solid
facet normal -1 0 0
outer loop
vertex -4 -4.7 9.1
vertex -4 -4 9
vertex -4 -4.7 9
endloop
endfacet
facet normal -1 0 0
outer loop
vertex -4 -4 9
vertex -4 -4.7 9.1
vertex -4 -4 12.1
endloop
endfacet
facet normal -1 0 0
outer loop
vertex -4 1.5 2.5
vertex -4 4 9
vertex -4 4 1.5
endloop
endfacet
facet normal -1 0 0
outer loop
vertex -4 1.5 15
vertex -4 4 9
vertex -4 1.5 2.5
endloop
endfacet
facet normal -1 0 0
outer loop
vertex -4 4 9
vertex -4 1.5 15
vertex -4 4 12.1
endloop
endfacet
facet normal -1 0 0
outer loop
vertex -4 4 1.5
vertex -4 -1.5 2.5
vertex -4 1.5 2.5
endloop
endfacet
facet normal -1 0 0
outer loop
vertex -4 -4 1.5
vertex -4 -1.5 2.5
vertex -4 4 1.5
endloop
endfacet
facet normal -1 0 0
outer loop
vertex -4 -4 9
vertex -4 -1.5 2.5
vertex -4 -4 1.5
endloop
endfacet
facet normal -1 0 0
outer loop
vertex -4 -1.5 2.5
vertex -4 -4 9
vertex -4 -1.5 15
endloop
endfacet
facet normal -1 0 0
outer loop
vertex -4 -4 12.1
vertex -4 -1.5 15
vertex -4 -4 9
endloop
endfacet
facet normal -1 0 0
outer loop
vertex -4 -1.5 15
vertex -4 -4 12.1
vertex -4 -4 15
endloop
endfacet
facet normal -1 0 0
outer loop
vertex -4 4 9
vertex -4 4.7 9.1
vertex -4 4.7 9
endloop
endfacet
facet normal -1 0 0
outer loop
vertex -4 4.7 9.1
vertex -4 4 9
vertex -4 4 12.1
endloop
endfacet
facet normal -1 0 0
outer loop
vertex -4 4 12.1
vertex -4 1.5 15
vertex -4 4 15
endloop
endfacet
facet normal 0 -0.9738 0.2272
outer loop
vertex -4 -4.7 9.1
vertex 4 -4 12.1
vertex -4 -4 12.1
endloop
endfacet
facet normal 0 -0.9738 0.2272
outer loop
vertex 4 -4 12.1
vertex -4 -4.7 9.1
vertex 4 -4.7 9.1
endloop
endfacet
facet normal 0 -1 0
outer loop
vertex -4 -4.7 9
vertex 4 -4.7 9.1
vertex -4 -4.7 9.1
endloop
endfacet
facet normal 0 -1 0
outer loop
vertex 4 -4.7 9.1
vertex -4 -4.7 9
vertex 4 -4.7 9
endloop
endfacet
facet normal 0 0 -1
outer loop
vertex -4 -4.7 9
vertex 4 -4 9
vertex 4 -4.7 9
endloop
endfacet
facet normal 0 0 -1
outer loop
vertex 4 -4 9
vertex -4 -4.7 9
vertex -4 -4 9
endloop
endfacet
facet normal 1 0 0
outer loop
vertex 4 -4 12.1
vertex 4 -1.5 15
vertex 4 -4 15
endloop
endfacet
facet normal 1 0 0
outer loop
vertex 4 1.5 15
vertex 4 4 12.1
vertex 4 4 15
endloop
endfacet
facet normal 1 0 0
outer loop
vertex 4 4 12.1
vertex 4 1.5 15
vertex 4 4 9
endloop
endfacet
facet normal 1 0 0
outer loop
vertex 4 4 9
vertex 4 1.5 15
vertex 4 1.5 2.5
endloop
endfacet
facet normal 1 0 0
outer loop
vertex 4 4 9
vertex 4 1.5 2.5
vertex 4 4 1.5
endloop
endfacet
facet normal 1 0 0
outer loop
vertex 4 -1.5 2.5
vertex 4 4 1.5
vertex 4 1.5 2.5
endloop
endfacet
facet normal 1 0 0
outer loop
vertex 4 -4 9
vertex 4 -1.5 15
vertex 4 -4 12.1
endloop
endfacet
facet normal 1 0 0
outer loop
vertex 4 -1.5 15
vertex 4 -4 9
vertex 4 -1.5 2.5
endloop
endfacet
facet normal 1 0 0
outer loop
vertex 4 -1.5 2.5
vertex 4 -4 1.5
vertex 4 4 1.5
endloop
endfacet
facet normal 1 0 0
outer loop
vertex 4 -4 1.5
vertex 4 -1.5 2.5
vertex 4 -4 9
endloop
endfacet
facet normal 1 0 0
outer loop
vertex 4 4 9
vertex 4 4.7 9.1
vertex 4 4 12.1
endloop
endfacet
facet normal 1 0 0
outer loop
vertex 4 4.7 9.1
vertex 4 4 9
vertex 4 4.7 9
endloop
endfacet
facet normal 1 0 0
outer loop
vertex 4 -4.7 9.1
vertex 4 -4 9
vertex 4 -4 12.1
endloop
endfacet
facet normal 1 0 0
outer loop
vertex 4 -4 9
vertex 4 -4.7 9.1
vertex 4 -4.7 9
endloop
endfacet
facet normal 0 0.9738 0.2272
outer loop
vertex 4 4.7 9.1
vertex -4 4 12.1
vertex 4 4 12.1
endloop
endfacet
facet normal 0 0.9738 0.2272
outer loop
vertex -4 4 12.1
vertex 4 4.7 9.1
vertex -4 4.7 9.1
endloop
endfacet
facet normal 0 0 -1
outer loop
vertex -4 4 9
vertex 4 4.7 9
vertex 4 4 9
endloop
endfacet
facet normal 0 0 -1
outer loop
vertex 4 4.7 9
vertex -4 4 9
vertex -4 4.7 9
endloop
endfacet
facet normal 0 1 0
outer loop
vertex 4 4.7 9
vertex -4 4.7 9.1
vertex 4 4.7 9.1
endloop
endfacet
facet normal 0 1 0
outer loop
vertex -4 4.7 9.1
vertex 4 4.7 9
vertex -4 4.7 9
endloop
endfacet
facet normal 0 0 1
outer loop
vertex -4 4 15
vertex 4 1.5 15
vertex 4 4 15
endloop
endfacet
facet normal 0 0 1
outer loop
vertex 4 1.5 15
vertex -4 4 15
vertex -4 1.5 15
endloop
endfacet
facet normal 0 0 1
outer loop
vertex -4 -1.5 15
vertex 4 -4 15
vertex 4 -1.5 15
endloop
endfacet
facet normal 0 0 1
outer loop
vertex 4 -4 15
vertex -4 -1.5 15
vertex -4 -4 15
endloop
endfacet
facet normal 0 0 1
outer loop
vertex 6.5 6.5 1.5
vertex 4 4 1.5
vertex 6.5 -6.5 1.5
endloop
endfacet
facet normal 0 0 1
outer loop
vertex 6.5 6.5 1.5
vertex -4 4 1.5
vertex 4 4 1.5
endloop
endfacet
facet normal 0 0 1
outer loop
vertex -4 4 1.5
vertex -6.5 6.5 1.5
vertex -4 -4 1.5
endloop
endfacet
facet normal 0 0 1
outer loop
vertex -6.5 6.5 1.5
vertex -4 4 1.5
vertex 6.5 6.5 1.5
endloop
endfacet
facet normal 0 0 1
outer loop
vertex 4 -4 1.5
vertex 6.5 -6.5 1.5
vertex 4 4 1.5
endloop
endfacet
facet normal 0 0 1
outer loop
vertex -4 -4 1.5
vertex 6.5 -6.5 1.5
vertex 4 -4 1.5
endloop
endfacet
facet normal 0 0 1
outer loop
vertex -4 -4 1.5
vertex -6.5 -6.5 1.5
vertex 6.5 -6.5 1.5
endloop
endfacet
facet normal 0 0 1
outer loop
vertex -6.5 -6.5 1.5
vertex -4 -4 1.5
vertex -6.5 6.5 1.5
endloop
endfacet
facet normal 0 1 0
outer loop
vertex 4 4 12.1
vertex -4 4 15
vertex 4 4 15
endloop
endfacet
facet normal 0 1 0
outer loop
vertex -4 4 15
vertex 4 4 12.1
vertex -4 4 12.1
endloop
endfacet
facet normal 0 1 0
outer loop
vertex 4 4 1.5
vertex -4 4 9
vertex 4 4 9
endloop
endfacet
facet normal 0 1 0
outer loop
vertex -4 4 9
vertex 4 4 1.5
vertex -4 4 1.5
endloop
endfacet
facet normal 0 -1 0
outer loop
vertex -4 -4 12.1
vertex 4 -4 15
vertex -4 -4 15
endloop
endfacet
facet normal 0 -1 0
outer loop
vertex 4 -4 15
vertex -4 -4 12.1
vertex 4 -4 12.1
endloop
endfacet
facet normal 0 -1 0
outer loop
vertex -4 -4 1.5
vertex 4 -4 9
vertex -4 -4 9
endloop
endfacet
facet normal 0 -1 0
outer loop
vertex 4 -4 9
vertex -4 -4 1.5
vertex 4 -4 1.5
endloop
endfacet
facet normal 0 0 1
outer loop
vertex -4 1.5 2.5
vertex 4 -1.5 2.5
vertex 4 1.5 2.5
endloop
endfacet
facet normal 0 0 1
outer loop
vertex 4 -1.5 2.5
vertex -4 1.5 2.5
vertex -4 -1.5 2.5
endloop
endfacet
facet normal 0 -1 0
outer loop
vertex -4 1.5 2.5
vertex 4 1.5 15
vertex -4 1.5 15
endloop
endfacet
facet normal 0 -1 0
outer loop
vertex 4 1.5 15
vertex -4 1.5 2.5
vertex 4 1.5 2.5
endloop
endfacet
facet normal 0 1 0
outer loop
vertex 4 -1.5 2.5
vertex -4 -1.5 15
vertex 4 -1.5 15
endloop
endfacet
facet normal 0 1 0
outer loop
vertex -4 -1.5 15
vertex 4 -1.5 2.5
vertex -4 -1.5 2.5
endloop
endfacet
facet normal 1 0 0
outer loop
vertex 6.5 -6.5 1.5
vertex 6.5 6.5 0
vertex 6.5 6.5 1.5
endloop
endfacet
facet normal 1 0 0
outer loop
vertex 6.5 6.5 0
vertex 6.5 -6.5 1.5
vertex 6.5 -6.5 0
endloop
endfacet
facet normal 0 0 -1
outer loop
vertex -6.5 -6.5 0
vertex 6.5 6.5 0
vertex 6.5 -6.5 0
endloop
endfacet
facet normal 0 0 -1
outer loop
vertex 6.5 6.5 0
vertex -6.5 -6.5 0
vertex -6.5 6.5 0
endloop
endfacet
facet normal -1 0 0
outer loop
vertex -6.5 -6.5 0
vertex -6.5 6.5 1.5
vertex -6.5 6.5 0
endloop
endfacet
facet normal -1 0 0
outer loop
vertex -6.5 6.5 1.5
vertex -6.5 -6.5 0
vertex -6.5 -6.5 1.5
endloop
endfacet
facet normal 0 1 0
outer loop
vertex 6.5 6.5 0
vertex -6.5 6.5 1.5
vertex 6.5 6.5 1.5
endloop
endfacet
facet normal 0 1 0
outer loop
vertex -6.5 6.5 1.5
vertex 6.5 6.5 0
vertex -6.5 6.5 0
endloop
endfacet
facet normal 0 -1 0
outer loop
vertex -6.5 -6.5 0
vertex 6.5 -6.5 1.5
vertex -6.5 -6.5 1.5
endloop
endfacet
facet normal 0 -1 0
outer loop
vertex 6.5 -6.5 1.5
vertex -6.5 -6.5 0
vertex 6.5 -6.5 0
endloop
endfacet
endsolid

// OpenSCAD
// Test button plunger: cap on a split stem with two snap barbs. The cap lands on
// the panel at full travel: that is the hard stop. Print 4, cap on the bed.
include <../cad/params.scad>
include <../cad/lib.scad>

cap_t = btn_proud - btn_travel;
stem_len = btn_travel - tb_leaf_z; // cap underside to leaf, at rest
barb_z = rp_t + btn_travel;        // cap underside to barb shoulder

assert(cap_t >= 1.2, "cap too thin: btn_proud - btn_travel");

module test_button_plunger() {
    box(-tb_cap / 2, tb_cap / 2, -tb_cap / 2, tb_cap / 2, 0, cap_t);
    difference() {
        union() {
            box(-tb_stem / 2, tb_stem / 2, -tb_stem / 2, tb_stem / 2, cap_t, cap_t + stem_len);
            for (s = [-1, 1]) hull() {
                translate([-tb_stem / 2, s > 0 ? tb_stem / 2 - 0.1 : -tb_stem / 2 - tb_barb, cap_t + barb_z])
                    cube([tb_stem, tb_barb + 0.1, 0.1]);
                translate([-tb_stem / 2, s > 0 ? tb_stem / 2 - 0.1 : -tb_stem / 2, cap_t + barb_z + 3])
                    cube([tb_stem, 0.1, 0.1]);
            }
        }
        // slit so the barbs flex through the hole
        box(-tb_stem, tb_stem, -tb_slit / 2, tb_slit / 2, cap_t + 1, cap_t + stem_len + 1);
    }
}

test_button_plunger();
